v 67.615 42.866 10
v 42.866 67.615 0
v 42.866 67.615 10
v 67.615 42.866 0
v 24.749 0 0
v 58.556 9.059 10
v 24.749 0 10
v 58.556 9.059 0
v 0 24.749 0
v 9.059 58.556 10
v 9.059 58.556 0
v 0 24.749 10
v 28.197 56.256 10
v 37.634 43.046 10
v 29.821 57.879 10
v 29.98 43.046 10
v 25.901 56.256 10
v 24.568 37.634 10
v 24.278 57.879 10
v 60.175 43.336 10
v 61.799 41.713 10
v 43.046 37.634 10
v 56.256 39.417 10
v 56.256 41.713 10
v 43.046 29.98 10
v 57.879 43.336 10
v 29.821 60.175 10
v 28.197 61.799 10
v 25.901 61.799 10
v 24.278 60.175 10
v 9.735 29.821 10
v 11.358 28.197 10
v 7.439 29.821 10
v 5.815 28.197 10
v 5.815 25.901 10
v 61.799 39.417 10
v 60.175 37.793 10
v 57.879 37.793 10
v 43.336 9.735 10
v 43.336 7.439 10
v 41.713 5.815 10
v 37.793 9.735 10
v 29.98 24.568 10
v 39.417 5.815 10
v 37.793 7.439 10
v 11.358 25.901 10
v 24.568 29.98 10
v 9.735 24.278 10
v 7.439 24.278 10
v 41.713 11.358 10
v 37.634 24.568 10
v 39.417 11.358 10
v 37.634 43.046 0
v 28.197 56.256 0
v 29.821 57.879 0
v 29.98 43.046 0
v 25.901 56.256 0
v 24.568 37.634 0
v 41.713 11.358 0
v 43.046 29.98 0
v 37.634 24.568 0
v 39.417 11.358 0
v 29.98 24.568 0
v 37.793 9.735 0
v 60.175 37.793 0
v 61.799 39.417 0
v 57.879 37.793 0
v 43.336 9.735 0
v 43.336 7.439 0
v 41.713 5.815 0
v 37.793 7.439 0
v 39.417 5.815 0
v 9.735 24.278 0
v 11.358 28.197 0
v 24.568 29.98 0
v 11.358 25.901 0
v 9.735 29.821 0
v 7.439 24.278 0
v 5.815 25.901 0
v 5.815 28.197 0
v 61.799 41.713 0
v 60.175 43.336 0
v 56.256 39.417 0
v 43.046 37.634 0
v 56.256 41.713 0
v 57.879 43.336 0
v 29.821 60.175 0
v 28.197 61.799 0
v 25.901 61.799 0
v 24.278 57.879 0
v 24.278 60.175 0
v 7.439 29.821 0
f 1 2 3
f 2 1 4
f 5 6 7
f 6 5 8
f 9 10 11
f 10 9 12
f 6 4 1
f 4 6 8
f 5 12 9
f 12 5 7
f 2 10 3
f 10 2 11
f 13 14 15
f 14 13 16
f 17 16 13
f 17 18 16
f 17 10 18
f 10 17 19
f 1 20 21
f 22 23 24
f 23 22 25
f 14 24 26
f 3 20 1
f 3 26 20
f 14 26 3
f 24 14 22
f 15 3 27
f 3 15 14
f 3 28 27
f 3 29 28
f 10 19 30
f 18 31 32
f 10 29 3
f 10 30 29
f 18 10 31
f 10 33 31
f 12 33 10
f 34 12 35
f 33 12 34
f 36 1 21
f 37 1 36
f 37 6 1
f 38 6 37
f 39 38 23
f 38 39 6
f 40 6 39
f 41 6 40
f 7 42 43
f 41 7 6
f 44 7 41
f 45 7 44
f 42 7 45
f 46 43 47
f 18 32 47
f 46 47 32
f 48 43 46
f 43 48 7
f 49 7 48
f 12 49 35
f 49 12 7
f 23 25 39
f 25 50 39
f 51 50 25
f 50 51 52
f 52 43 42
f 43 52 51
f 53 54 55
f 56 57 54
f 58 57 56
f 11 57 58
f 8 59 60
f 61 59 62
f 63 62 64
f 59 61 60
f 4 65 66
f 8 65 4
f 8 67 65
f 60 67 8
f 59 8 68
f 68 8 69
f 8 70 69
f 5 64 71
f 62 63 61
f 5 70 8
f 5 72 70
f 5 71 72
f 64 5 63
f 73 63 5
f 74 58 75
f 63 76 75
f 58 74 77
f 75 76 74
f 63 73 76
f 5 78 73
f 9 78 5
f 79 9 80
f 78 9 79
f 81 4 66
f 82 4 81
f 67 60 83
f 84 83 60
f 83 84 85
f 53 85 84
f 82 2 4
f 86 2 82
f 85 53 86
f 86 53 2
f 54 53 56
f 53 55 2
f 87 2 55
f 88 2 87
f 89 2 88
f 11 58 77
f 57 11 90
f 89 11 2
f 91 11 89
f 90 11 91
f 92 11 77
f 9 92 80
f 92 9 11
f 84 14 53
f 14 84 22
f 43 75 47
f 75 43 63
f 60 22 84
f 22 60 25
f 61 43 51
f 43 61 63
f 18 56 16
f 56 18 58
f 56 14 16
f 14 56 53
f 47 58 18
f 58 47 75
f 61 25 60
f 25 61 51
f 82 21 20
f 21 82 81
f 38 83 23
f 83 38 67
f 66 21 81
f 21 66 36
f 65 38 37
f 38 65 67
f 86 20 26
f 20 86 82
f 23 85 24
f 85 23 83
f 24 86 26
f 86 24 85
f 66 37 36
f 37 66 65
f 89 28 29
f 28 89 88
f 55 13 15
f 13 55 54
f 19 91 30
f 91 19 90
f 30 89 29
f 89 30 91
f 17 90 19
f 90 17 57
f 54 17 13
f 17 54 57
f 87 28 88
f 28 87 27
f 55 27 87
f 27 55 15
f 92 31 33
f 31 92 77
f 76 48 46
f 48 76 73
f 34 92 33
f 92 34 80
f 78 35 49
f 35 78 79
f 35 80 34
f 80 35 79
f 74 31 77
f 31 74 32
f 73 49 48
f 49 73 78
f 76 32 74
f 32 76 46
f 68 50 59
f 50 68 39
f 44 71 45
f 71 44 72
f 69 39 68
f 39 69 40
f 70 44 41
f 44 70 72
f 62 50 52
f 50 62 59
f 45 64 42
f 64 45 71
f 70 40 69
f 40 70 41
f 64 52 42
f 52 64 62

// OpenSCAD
$fn = 32;

// ----------------------------------------------------------------------
// Polygon plate: 6-gon R35, 4 bolt windows
// ----------------------------------------------------------------------

// --- parameters (mm) ---
sides = 6;                // number of polygon sides
plate_r = 35;             // circumscribed radius of the polygon
bore_r = 10;              // centre bore radius
bolts = 4;                // number of bolt windows
ring_r = 26.11;           // bolt-circle radius
bolt_r = 3;               // bolt window radius
plate_t = 10;             // plate thickness, Z (extrusion height)

plate_d = 2 * plate_r;  // circumscribed diameter
bore_d = 2 * bore_r;  // centre bore diameter
bolt_d = 2 * bolt_r;  // bolt window diameter
ring_d = 2 * ring_r;  // bolt-circle diameter

profile = [[67.615, 42.866], [42.866, 67.615], [9.059, 58.556], [0, 24.749], [24.749, 0], [58.556, 9.059]];  // primary outline, 6 points, counter clockwise
void_1 = [[43.046, 37.634], [37.634, 43.046], [29.98, 43.046], [24.568, 37.634], [24.568, 29.98], [29.98, 24.568], [37.634, 24.568], [43.046, 29.98]];  // centre bore, 8 points
void_2 = [[61.799, 41.713], [60.175, 43.336], [57.879, 43.336], [56.256, 41.713], [56.256, 39.417], [57.879, 37.793], [60.175, 37.793], [61.799, 39.417]];  // bolt window 1, 8 points
void_3 = [[29.821, 60.175], [28.197, 61.799], [25.901, 61.799], [24.278, 60.175], [24.278, 57.879], [25.901, 56.256], [28.197, 56.256], [29.821, 57.879]];  // bolt window 2, 8 points
void_4 = [[11.358, 28.197], [9.735, 29.821], [7.439, 29.821], [5.815, 28.197], [5.815, 25.901], [7.439, 24.278], [9.735, 24.278], [11.358, 25.901]];  // bolt window 3, 8 points
void_5 = [[43.336, 9.735], [41.713, 11.358], [39.417, 11.358], [37.793, 9.735], [37.793, 7.439], [39.417, 5.815], [41.713, 5.815], [43.336, 7.439]];  // bolt window 4, 8 points

// --- the one profile operation ---
difference() {
  linear_extrude(height = plate_t) polygon(points = profile);
  translate([0, 0, -1])
    linear_extrude(height = plate_t + 2) polygon(points = void_1);
  translate([0, 0, -1])
    linear_extrude(height = plate_t + 2) polygon(points = void_2);
  translate([0, 0, -1])
    linear_extrude(height = plate_t + 2) polygon(points = void_3);
  translate([0, 0, -1])
    linear_extrude(height = plate_t + 2) polygon(points = void_4);
  translate([0, 0, -1])
    linear_extrude(height = plate_t + 2) polygon(points = void_5);
}
